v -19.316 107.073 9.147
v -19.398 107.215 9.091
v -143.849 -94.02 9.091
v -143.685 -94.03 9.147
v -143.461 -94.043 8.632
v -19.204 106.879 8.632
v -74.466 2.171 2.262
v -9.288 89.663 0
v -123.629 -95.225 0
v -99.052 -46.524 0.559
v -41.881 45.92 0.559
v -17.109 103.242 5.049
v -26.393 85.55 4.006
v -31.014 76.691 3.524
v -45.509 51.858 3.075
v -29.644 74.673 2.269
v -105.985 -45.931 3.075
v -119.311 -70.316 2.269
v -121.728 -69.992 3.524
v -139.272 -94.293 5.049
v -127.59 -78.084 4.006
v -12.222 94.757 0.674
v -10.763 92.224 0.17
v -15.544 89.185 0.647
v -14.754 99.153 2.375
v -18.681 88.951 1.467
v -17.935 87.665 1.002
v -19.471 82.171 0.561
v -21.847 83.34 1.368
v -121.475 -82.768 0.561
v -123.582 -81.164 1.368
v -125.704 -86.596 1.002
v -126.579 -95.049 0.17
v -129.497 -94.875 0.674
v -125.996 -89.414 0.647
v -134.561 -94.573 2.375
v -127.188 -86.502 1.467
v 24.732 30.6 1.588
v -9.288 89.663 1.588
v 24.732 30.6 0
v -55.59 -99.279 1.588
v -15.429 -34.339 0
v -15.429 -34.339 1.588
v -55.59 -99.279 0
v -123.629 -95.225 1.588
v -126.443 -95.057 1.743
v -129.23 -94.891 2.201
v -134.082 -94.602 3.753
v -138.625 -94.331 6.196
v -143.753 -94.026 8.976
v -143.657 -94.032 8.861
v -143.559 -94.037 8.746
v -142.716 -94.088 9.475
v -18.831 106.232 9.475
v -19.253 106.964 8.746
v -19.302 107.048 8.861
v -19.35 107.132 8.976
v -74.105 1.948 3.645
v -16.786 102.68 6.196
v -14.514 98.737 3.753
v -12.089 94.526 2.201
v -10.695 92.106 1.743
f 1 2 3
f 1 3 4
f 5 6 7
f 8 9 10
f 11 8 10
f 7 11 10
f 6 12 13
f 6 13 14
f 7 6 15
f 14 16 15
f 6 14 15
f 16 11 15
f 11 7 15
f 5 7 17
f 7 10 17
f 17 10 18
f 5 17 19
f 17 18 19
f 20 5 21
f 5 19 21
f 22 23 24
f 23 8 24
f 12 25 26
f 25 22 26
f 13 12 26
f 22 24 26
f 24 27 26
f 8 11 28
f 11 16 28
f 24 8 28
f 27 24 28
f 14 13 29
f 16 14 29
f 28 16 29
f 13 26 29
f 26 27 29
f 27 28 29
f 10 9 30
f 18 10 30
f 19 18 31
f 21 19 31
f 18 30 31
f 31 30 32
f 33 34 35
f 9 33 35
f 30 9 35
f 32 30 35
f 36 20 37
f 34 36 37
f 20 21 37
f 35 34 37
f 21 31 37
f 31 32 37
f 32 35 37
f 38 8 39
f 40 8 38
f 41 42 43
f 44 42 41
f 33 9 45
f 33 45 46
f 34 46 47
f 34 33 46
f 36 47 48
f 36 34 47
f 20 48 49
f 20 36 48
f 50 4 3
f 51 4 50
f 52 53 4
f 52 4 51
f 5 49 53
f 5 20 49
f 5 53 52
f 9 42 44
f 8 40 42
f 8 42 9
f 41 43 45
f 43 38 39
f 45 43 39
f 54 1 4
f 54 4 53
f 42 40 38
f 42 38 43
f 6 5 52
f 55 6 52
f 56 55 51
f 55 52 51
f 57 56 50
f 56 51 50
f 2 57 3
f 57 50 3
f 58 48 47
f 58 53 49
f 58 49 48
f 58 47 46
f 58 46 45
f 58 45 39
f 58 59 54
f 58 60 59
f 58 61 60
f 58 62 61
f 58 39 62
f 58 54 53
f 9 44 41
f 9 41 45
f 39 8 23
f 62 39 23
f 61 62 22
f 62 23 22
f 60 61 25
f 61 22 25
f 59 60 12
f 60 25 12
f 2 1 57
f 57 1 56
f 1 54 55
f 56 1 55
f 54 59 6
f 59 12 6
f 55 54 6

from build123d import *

# Parameters (mm, degrees)
BOSS_EXTRUDE1_DEPTH      = 1.5875
BOSS_EXTRUDE3_DEPTH      = 120
BOSS_EXTRUDE3_DEPTH_BACK = 120
CUT_EXTRUDE1_DEPTH       = 182.234838864


with BuildPart() as part:
    # Sketch1 → Boss-Extrude1 (new body)
    with BuildSketch(Plane.XY):
        Polygon((-55.589527783, -99.278633486), (-123.629375351, -95.224778061), (-9.287976323, 89.663408039), (24.731947461, 30.599888109), (-15.428790161, -34.339372689), align=None)
    extrude(amount=BOSS_EXTRUDE1_DEPTH)

    # Sketch4 → Boss-Extrude3 (add, two sides: drawn at the far end of the back side and taken through both)
    with BuildSketch(Plane(origin=(-19.629912529, -31.741249903, 0), x_dir=(0.8504980945941722, -0.5259781279594072, 0), z_dir=(0.5259781279594072, 0.8504980945941724, 0)).offset(-BOSS_EXTRUDE3_DEPTH_BACK)):
        with BuildLine():
            Line((-55.060397672, -1.5875), (-55.060397672, 0))
            add(Edge.make_bspline(
                [(-55.060397672, 0), (-65.213115138, 0), (-72.548531989, -8.632316441)],
                knots=[0.320978727, 0.320978727, 0.320978727, 1.185471829, 1.185471829, 1.185471829], degree=2, weights=[1, 0.908026935, 1]))
            ThreePointArc((-72.548531989, -8.632316441), (-72.721094469, -8.860608628), (-72.890676993, -9.091123051))
            Line((-72.890676993, -9.091123051), (-72.745996539, -9.14666735))
            Line((-72.745996539, -9.14666735), (-71.891585739, -9.474684354))
            add(Edge.make_bspline(
                [(-55.060397672, -1.5875), (-64.677105487, -1.5875), (-71.891585739, -9.474684354)],
                knots=[3.462571381, 3.462571381, 3.462571381, 4.286530008, 4.286530008, 4.286530008], degree=2, weights=[1, 0.916330054, 1]))
        make_face()
    extrude(amount=BOSS_EXTRUDE3_DEPTH + BOSS_EXTRUDE3_DEPTH_BACK)

    # Sketch5 → Cut-Extrude1 (cut, through all)
    with BuildSketch(Plane(origin=(0, 0, 0), x_dir=(-1, 0, 0), z_dir=(0, 0, -1))):
        Polygon((9.287976323, 89.663408039), (21.860519309, 111.491165443), (10.387842561, 118.099298331), (-2.424711001, 95.854847771), align=None)
        Polygon((123.629375351, -95.224778061), (148.774461323, -93.726618573), (149.561894462, -106.94288435), (123.936787337, -108.46964379), align=None)
    extrude(amount=-CUT_EXTRUDE1_DEPTH, mode=Mode.SUBTRACT)


solid = part.part
